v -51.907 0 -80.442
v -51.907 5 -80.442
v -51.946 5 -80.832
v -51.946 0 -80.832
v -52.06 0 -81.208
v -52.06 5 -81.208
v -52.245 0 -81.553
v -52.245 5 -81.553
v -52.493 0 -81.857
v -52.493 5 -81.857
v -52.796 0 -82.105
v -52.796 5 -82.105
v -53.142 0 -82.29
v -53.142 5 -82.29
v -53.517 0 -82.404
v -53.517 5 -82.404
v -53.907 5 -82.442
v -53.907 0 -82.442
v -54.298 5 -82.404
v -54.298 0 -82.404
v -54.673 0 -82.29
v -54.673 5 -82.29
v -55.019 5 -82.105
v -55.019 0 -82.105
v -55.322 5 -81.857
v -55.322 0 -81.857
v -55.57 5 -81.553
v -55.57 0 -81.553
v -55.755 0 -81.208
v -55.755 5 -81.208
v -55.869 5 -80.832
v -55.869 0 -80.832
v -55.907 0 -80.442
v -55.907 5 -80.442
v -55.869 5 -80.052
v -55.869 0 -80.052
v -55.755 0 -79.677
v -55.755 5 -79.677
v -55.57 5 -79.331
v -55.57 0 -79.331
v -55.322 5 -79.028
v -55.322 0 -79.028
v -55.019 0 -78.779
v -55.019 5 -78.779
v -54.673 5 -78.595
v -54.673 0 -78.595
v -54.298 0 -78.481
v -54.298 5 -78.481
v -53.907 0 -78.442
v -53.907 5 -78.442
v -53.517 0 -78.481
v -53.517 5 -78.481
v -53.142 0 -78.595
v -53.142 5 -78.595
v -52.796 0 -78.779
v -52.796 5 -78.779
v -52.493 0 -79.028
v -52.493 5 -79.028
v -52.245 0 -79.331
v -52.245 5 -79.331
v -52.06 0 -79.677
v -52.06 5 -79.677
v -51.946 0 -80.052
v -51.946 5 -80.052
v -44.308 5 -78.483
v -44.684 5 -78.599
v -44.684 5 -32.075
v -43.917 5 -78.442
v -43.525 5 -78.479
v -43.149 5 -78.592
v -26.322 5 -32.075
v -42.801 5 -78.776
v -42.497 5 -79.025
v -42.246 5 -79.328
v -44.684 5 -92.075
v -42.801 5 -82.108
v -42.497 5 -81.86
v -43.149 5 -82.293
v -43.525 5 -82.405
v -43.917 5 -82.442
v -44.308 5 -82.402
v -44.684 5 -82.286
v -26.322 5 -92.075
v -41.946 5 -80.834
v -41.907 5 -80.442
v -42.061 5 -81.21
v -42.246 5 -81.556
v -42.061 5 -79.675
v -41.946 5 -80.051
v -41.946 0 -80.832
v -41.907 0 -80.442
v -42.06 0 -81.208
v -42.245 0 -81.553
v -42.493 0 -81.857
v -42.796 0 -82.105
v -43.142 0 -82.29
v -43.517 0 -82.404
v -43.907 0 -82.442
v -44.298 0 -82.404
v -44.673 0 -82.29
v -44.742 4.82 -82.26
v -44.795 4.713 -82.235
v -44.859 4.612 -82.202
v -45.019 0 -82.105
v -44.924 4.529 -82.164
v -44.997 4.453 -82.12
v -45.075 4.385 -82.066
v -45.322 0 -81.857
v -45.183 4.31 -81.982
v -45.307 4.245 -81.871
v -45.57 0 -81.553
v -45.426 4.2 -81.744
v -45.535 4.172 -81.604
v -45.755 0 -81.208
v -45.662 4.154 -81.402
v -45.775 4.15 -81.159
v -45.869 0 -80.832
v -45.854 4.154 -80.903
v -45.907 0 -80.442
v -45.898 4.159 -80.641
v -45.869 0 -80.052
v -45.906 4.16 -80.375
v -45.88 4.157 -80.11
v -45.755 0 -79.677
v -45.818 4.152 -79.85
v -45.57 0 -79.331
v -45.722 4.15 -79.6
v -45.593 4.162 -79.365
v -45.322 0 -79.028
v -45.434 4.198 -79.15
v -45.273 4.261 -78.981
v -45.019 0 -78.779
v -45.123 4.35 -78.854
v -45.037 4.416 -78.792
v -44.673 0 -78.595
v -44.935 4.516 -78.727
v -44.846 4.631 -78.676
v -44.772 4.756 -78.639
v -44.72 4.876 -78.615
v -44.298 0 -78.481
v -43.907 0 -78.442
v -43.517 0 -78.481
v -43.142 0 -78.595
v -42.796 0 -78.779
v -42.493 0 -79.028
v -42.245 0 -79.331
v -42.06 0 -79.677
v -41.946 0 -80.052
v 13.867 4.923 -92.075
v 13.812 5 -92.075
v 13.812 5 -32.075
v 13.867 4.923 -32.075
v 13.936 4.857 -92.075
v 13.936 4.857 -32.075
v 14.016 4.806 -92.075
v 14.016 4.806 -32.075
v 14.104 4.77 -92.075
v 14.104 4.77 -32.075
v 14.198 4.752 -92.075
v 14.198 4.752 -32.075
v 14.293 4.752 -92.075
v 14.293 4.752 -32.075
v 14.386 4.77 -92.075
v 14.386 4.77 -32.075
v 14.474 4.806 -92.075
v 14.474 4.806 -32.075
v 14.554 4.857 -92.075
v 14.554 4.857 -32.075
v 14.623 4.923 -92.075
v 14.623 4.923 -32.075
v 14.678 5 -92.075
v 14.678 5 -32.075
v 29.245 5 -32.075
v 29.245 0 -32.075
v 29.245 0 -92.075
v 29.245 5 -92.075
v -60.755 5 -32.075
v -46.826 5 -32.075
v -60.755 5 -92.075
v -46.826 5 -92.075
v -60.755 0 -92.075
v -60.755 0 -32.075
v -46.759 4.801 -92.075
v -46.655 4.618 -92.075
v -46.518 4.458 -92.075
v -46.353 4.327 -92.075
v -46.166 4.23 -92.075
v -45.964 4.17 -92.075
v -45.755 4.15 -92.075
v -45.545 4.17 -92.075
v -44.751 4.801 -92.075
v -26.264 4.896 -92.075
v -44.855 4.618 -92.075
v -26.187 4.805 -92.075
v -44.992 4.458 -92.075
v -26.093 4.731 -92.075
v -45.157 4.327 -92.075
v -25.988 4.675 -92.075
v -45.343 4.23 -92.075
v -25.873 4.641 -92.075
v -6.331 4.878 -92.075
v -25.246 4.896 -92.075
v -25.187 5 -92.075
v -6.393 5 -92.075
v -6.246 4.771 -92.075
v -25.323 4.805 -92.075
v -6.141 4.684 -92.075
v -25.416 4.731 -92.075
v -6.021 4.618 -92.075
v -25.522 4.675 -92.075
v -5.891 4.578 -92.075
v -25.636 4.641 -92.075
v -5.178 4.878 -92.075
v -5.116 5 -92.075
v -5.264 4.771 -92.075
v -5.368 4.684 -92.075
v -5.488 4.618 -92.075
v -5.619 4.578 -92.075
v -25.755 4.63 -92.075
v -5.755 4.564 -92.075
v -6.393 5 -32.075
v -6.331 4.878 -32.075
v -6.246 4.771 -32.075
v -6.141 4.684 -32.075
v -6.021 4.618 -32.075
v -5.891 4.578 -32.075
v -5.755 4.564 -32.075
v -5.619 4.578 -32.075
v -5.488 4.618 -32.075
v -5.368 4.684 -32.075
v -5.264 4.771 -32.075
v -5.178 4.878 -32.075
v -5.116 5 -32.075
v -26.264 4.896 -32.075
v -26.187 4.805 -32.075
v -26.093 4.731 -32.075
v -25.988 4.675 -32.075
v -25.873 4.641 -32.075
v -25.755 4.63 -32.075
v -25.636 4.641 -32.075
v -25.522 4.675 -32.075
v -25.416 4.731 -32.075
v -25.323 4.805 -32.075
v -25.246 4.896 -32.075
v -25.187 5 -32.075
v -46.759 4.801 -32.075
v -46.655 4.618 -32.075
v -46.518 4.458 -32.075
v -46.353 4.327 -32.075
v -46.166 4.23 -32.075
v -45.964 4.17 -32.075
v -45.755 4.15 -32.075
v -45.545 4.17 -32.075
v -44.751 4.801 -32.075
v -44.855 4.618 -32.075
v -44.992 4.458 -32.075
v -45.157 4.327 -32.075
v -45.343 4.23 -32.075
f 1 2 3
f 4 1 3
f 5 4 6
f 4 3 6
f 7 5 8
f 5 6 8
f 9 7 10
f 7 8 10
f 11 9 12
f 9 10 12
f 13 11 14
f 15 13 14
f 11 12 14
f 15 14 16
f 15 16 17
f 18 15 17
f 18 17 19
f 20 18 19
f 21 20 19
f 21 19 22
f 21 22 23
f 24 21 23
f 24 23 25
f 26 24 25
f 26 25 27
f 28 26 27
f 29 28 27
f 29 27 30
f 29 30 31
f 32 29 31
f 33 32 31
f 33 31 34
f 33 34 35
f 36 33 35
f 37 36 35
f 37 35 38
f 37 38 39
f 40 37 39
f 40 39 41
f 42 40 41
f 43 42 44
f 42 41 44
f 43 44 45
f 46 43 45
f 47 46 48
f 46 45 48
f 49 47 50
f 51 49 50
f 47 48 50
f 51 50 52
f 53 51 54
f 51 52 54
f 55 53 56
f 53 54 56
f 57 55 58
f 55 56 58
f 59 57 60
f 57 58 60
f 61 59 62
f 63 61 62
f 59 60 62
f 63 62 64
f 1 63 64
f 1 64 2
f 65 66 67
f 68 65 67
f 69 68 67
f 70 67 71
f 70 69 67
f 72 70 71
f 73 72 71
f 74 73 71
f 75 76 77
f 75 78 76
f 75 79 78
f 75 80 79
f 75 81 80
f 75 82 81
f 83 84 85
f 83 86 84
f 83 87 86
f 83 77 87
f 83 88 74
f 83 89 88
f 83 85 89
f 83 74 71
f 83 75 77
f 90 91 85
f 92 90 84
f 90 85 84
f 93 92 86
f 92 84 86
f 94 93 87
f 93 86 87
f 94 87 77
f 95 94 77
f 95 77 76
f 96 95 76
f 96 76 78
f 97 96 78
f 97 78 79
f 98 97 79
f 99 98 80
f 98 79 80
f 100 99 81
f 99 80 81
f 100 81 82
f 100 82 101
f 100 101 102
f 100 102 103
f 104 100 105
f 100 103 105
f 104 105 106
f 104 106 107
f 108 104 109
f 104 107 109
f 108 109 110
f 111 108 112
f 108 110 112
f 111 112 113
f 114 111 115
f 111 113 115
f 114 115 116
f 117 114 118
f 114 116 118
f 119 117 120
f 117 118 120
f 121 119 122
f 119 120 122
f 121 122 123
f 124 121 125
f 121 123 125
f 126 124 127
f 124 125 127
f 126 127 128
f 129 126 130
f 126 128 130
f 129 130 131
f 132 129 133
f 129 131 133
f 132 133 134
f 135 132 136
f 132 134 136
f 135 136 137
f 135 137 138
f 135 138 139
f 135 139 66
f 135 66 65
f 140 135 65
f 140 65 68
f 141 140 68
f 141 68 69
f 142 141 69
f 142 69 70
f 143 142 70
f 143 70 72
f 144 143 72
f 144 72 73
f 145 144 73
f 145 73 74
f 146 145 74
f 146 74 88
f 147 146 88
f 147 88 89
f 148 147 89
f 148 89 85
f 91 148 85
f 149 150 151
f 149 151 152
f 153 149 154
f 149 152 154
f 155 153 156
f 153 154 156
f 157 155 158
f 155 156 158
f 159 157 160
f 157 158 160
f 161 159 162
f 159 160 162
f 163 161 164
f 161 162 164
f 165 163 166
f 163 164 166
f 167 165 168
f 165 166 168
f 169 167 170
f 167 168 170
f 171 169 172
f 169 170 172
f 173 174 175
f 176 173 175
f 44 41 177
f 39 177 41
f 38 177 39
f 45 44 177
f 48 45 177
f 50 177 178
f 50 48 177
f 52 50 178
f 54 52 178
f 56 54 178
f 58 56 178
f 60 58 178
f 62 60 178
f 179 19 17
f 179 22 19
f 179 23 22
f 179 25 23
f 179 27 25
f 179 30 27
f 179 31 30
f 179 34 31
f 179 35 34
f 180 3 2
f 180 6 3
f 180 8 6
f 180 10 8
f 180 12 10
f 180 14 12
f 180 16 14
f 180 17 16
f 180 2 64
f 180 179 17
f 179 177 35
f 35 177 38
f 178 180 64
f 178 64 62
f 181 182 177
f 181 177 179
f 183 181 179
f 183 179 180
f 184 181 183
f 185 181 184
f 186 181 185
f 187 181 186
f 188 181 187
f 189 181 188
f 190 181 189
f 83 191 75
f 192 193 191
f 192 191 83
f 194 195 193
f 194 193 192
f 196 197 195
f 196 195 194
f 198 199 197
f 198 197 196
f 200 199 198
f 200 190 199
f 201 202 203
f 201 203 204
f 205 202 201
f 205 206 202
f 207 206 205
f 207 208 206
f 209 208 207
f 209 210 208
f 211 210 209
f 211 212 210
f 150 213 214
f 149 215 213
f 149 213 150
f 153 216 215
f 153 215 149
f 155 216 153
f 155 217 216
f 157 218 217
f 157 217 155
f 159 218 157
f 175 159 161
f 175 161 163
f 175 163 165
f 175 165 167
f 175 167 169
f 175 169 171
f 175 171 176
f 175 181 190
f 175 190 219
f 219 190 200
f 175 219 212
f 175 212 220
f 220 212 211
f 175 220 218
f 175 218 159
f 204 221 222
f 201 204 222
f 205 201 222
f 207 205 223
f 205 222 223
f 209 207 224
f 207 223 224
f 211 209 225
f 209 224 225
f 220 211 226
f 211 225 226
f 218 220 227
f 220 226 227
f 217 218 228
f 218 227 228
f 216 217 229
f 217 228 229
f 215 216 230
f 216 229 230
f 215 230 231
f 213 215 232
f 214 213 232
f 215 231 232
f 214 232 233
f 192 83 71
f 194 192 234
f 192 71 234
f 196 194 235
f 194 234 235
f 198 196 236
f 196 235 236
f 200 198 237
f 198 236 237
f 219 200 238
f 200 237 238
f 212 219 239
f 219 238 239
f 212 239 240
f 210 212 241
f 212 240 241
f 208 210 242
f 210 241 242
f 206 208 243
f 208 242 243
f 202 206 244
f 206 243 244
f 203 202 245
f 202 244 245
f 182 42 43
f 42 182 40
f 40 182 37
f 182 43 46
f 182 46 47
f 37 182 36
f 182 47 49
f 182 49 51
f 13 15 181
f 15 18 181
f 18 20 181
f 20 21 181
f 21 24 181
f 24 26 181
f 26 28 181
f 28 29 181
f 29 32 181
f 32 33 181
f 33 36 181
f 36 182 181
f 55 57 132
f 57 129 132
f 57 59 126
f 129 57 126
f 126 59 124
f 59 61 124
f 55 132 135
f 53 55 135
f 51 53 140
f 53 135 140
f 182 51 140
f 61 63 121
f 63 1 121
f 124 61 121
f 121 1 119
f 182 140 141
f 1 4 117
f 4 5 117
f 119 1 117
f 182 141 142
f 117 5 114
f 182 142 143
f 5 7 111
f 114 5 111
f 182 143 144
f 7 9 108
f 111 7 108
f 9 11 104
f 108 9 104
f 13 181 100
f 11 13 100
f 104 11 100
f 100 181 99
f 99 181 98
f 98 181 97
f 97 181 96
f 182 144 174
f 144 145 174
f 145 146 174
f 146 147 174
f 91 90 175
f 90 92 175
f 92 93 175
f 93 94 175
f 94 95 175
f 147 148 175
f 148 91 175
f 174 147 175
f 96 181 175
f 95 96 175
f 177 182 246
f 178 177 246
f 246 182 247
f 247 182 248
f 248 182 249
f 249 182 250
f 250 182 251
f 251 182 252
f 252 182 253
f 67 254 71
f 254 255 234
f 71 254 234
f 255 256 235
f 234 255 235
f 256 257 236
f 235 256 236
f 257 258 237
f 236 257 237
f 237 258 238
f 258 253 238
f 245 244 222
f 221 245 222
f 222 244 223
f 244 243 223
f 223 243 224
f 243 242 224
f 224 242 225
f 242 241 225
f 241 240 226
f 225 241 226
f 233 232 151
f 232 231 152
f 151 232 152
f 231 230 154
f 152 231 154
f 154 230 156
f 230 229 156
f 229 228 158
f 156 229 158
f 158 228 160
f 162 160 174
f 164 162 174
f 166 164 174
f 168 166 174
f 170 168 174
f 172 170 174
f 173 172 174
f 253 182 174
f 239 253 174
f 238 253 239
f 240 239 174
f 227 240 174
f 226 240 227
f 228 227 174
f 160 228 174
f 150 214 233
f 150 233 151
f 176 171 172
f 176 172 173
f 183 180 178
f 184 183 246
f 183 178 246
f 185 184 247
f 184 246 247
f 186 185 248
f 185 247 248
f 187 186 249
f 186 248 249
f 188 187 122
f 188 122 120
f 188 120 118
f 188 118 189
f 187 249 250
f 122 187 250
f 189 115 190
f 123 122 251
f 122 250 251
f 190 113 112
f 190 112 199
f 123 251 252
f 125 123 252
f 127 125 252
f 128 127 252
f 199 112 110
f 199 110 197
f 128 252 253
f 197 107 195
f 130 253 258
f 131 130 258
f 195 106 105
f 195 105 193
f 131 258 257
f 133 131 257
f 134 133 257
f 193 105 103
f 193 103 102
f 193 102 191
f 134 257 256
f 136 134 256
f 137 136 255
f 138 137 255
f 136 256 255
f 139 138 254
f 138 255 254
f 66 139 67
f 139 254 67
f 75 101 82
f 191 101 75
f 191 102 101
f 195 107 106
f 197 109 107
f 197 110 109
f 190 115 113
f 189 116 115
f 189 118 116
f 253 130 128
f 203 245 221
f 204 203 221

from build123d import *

# Parameters (mm, degrees)
SKETCH1_W           = 90
SKETCH1_H           = 60
BOSS_EXTRUDE1_DEPTH = 5
SKETCH2_R           = 1.1
SKETCH2_R_2         = 0.62
SKETCH2_R_3         = 0.6858
SKETCH2_R_4         = 0.5
CUT_EXTRUDE1_DEPTH  = 61
SKETCH3_R           = 2
CUT_EXTRUDE2_DEPTH  = 6


with BuildPart() as part:
    # Sketch1 → Boss-Extrude1 (new body)
    with BuildSketch(Plane(origin=(0, 0, 0), x_dir=(1, 0, 0), z_dir=(0, 1, 0))):
        with Locations((-15.754716981, 62.075471698)):
            Rectangle(SKETCH1_W, SKETCH1_H)
    extrude(amount=BOSS_EXTRUDE1_DEPTH)

    # Sketch2 → Cut-Extrude1 (cut, through all)
    with BuildSketch(Plane.XY.offset(-32.075471698)):
        with Locations((-45.754716981, 5.25)):
            Circle(SKETCH2_R)
        with Locations((-25.754716981, 5.25)):
            Circle(SKETCH2_R_2)
        with Locations((-5.754716981, 5.25)):
            Circle(SKETCH2_R_3)
        with Locations((14.245283019, 5.25)):
            Circle(SKETCH2_R_4)
    extrude(amount=-CUT_EXTRUDE1_DEPTH, mode=Mode.SUBTRACT)

    # Sketch3 → Cut-Extrude2 (cut, through all)
    with BuildSketch(Plane(origin=(0, 5, 0), x_dir=(1, 0, 0), z_dir=(0, 1, 0))):
        with Locations((-53.907444579, 80.442311963)):
            Circle(SKETCH3_R)
        with Locations((-43.907444579, 80.442311963)):
            Circle(SKETCH3_R)
    extrude(amount=-CUT_EXTRUDE2_DEPTH, mode=Mode.SUBTRACT)


solid = part.part
